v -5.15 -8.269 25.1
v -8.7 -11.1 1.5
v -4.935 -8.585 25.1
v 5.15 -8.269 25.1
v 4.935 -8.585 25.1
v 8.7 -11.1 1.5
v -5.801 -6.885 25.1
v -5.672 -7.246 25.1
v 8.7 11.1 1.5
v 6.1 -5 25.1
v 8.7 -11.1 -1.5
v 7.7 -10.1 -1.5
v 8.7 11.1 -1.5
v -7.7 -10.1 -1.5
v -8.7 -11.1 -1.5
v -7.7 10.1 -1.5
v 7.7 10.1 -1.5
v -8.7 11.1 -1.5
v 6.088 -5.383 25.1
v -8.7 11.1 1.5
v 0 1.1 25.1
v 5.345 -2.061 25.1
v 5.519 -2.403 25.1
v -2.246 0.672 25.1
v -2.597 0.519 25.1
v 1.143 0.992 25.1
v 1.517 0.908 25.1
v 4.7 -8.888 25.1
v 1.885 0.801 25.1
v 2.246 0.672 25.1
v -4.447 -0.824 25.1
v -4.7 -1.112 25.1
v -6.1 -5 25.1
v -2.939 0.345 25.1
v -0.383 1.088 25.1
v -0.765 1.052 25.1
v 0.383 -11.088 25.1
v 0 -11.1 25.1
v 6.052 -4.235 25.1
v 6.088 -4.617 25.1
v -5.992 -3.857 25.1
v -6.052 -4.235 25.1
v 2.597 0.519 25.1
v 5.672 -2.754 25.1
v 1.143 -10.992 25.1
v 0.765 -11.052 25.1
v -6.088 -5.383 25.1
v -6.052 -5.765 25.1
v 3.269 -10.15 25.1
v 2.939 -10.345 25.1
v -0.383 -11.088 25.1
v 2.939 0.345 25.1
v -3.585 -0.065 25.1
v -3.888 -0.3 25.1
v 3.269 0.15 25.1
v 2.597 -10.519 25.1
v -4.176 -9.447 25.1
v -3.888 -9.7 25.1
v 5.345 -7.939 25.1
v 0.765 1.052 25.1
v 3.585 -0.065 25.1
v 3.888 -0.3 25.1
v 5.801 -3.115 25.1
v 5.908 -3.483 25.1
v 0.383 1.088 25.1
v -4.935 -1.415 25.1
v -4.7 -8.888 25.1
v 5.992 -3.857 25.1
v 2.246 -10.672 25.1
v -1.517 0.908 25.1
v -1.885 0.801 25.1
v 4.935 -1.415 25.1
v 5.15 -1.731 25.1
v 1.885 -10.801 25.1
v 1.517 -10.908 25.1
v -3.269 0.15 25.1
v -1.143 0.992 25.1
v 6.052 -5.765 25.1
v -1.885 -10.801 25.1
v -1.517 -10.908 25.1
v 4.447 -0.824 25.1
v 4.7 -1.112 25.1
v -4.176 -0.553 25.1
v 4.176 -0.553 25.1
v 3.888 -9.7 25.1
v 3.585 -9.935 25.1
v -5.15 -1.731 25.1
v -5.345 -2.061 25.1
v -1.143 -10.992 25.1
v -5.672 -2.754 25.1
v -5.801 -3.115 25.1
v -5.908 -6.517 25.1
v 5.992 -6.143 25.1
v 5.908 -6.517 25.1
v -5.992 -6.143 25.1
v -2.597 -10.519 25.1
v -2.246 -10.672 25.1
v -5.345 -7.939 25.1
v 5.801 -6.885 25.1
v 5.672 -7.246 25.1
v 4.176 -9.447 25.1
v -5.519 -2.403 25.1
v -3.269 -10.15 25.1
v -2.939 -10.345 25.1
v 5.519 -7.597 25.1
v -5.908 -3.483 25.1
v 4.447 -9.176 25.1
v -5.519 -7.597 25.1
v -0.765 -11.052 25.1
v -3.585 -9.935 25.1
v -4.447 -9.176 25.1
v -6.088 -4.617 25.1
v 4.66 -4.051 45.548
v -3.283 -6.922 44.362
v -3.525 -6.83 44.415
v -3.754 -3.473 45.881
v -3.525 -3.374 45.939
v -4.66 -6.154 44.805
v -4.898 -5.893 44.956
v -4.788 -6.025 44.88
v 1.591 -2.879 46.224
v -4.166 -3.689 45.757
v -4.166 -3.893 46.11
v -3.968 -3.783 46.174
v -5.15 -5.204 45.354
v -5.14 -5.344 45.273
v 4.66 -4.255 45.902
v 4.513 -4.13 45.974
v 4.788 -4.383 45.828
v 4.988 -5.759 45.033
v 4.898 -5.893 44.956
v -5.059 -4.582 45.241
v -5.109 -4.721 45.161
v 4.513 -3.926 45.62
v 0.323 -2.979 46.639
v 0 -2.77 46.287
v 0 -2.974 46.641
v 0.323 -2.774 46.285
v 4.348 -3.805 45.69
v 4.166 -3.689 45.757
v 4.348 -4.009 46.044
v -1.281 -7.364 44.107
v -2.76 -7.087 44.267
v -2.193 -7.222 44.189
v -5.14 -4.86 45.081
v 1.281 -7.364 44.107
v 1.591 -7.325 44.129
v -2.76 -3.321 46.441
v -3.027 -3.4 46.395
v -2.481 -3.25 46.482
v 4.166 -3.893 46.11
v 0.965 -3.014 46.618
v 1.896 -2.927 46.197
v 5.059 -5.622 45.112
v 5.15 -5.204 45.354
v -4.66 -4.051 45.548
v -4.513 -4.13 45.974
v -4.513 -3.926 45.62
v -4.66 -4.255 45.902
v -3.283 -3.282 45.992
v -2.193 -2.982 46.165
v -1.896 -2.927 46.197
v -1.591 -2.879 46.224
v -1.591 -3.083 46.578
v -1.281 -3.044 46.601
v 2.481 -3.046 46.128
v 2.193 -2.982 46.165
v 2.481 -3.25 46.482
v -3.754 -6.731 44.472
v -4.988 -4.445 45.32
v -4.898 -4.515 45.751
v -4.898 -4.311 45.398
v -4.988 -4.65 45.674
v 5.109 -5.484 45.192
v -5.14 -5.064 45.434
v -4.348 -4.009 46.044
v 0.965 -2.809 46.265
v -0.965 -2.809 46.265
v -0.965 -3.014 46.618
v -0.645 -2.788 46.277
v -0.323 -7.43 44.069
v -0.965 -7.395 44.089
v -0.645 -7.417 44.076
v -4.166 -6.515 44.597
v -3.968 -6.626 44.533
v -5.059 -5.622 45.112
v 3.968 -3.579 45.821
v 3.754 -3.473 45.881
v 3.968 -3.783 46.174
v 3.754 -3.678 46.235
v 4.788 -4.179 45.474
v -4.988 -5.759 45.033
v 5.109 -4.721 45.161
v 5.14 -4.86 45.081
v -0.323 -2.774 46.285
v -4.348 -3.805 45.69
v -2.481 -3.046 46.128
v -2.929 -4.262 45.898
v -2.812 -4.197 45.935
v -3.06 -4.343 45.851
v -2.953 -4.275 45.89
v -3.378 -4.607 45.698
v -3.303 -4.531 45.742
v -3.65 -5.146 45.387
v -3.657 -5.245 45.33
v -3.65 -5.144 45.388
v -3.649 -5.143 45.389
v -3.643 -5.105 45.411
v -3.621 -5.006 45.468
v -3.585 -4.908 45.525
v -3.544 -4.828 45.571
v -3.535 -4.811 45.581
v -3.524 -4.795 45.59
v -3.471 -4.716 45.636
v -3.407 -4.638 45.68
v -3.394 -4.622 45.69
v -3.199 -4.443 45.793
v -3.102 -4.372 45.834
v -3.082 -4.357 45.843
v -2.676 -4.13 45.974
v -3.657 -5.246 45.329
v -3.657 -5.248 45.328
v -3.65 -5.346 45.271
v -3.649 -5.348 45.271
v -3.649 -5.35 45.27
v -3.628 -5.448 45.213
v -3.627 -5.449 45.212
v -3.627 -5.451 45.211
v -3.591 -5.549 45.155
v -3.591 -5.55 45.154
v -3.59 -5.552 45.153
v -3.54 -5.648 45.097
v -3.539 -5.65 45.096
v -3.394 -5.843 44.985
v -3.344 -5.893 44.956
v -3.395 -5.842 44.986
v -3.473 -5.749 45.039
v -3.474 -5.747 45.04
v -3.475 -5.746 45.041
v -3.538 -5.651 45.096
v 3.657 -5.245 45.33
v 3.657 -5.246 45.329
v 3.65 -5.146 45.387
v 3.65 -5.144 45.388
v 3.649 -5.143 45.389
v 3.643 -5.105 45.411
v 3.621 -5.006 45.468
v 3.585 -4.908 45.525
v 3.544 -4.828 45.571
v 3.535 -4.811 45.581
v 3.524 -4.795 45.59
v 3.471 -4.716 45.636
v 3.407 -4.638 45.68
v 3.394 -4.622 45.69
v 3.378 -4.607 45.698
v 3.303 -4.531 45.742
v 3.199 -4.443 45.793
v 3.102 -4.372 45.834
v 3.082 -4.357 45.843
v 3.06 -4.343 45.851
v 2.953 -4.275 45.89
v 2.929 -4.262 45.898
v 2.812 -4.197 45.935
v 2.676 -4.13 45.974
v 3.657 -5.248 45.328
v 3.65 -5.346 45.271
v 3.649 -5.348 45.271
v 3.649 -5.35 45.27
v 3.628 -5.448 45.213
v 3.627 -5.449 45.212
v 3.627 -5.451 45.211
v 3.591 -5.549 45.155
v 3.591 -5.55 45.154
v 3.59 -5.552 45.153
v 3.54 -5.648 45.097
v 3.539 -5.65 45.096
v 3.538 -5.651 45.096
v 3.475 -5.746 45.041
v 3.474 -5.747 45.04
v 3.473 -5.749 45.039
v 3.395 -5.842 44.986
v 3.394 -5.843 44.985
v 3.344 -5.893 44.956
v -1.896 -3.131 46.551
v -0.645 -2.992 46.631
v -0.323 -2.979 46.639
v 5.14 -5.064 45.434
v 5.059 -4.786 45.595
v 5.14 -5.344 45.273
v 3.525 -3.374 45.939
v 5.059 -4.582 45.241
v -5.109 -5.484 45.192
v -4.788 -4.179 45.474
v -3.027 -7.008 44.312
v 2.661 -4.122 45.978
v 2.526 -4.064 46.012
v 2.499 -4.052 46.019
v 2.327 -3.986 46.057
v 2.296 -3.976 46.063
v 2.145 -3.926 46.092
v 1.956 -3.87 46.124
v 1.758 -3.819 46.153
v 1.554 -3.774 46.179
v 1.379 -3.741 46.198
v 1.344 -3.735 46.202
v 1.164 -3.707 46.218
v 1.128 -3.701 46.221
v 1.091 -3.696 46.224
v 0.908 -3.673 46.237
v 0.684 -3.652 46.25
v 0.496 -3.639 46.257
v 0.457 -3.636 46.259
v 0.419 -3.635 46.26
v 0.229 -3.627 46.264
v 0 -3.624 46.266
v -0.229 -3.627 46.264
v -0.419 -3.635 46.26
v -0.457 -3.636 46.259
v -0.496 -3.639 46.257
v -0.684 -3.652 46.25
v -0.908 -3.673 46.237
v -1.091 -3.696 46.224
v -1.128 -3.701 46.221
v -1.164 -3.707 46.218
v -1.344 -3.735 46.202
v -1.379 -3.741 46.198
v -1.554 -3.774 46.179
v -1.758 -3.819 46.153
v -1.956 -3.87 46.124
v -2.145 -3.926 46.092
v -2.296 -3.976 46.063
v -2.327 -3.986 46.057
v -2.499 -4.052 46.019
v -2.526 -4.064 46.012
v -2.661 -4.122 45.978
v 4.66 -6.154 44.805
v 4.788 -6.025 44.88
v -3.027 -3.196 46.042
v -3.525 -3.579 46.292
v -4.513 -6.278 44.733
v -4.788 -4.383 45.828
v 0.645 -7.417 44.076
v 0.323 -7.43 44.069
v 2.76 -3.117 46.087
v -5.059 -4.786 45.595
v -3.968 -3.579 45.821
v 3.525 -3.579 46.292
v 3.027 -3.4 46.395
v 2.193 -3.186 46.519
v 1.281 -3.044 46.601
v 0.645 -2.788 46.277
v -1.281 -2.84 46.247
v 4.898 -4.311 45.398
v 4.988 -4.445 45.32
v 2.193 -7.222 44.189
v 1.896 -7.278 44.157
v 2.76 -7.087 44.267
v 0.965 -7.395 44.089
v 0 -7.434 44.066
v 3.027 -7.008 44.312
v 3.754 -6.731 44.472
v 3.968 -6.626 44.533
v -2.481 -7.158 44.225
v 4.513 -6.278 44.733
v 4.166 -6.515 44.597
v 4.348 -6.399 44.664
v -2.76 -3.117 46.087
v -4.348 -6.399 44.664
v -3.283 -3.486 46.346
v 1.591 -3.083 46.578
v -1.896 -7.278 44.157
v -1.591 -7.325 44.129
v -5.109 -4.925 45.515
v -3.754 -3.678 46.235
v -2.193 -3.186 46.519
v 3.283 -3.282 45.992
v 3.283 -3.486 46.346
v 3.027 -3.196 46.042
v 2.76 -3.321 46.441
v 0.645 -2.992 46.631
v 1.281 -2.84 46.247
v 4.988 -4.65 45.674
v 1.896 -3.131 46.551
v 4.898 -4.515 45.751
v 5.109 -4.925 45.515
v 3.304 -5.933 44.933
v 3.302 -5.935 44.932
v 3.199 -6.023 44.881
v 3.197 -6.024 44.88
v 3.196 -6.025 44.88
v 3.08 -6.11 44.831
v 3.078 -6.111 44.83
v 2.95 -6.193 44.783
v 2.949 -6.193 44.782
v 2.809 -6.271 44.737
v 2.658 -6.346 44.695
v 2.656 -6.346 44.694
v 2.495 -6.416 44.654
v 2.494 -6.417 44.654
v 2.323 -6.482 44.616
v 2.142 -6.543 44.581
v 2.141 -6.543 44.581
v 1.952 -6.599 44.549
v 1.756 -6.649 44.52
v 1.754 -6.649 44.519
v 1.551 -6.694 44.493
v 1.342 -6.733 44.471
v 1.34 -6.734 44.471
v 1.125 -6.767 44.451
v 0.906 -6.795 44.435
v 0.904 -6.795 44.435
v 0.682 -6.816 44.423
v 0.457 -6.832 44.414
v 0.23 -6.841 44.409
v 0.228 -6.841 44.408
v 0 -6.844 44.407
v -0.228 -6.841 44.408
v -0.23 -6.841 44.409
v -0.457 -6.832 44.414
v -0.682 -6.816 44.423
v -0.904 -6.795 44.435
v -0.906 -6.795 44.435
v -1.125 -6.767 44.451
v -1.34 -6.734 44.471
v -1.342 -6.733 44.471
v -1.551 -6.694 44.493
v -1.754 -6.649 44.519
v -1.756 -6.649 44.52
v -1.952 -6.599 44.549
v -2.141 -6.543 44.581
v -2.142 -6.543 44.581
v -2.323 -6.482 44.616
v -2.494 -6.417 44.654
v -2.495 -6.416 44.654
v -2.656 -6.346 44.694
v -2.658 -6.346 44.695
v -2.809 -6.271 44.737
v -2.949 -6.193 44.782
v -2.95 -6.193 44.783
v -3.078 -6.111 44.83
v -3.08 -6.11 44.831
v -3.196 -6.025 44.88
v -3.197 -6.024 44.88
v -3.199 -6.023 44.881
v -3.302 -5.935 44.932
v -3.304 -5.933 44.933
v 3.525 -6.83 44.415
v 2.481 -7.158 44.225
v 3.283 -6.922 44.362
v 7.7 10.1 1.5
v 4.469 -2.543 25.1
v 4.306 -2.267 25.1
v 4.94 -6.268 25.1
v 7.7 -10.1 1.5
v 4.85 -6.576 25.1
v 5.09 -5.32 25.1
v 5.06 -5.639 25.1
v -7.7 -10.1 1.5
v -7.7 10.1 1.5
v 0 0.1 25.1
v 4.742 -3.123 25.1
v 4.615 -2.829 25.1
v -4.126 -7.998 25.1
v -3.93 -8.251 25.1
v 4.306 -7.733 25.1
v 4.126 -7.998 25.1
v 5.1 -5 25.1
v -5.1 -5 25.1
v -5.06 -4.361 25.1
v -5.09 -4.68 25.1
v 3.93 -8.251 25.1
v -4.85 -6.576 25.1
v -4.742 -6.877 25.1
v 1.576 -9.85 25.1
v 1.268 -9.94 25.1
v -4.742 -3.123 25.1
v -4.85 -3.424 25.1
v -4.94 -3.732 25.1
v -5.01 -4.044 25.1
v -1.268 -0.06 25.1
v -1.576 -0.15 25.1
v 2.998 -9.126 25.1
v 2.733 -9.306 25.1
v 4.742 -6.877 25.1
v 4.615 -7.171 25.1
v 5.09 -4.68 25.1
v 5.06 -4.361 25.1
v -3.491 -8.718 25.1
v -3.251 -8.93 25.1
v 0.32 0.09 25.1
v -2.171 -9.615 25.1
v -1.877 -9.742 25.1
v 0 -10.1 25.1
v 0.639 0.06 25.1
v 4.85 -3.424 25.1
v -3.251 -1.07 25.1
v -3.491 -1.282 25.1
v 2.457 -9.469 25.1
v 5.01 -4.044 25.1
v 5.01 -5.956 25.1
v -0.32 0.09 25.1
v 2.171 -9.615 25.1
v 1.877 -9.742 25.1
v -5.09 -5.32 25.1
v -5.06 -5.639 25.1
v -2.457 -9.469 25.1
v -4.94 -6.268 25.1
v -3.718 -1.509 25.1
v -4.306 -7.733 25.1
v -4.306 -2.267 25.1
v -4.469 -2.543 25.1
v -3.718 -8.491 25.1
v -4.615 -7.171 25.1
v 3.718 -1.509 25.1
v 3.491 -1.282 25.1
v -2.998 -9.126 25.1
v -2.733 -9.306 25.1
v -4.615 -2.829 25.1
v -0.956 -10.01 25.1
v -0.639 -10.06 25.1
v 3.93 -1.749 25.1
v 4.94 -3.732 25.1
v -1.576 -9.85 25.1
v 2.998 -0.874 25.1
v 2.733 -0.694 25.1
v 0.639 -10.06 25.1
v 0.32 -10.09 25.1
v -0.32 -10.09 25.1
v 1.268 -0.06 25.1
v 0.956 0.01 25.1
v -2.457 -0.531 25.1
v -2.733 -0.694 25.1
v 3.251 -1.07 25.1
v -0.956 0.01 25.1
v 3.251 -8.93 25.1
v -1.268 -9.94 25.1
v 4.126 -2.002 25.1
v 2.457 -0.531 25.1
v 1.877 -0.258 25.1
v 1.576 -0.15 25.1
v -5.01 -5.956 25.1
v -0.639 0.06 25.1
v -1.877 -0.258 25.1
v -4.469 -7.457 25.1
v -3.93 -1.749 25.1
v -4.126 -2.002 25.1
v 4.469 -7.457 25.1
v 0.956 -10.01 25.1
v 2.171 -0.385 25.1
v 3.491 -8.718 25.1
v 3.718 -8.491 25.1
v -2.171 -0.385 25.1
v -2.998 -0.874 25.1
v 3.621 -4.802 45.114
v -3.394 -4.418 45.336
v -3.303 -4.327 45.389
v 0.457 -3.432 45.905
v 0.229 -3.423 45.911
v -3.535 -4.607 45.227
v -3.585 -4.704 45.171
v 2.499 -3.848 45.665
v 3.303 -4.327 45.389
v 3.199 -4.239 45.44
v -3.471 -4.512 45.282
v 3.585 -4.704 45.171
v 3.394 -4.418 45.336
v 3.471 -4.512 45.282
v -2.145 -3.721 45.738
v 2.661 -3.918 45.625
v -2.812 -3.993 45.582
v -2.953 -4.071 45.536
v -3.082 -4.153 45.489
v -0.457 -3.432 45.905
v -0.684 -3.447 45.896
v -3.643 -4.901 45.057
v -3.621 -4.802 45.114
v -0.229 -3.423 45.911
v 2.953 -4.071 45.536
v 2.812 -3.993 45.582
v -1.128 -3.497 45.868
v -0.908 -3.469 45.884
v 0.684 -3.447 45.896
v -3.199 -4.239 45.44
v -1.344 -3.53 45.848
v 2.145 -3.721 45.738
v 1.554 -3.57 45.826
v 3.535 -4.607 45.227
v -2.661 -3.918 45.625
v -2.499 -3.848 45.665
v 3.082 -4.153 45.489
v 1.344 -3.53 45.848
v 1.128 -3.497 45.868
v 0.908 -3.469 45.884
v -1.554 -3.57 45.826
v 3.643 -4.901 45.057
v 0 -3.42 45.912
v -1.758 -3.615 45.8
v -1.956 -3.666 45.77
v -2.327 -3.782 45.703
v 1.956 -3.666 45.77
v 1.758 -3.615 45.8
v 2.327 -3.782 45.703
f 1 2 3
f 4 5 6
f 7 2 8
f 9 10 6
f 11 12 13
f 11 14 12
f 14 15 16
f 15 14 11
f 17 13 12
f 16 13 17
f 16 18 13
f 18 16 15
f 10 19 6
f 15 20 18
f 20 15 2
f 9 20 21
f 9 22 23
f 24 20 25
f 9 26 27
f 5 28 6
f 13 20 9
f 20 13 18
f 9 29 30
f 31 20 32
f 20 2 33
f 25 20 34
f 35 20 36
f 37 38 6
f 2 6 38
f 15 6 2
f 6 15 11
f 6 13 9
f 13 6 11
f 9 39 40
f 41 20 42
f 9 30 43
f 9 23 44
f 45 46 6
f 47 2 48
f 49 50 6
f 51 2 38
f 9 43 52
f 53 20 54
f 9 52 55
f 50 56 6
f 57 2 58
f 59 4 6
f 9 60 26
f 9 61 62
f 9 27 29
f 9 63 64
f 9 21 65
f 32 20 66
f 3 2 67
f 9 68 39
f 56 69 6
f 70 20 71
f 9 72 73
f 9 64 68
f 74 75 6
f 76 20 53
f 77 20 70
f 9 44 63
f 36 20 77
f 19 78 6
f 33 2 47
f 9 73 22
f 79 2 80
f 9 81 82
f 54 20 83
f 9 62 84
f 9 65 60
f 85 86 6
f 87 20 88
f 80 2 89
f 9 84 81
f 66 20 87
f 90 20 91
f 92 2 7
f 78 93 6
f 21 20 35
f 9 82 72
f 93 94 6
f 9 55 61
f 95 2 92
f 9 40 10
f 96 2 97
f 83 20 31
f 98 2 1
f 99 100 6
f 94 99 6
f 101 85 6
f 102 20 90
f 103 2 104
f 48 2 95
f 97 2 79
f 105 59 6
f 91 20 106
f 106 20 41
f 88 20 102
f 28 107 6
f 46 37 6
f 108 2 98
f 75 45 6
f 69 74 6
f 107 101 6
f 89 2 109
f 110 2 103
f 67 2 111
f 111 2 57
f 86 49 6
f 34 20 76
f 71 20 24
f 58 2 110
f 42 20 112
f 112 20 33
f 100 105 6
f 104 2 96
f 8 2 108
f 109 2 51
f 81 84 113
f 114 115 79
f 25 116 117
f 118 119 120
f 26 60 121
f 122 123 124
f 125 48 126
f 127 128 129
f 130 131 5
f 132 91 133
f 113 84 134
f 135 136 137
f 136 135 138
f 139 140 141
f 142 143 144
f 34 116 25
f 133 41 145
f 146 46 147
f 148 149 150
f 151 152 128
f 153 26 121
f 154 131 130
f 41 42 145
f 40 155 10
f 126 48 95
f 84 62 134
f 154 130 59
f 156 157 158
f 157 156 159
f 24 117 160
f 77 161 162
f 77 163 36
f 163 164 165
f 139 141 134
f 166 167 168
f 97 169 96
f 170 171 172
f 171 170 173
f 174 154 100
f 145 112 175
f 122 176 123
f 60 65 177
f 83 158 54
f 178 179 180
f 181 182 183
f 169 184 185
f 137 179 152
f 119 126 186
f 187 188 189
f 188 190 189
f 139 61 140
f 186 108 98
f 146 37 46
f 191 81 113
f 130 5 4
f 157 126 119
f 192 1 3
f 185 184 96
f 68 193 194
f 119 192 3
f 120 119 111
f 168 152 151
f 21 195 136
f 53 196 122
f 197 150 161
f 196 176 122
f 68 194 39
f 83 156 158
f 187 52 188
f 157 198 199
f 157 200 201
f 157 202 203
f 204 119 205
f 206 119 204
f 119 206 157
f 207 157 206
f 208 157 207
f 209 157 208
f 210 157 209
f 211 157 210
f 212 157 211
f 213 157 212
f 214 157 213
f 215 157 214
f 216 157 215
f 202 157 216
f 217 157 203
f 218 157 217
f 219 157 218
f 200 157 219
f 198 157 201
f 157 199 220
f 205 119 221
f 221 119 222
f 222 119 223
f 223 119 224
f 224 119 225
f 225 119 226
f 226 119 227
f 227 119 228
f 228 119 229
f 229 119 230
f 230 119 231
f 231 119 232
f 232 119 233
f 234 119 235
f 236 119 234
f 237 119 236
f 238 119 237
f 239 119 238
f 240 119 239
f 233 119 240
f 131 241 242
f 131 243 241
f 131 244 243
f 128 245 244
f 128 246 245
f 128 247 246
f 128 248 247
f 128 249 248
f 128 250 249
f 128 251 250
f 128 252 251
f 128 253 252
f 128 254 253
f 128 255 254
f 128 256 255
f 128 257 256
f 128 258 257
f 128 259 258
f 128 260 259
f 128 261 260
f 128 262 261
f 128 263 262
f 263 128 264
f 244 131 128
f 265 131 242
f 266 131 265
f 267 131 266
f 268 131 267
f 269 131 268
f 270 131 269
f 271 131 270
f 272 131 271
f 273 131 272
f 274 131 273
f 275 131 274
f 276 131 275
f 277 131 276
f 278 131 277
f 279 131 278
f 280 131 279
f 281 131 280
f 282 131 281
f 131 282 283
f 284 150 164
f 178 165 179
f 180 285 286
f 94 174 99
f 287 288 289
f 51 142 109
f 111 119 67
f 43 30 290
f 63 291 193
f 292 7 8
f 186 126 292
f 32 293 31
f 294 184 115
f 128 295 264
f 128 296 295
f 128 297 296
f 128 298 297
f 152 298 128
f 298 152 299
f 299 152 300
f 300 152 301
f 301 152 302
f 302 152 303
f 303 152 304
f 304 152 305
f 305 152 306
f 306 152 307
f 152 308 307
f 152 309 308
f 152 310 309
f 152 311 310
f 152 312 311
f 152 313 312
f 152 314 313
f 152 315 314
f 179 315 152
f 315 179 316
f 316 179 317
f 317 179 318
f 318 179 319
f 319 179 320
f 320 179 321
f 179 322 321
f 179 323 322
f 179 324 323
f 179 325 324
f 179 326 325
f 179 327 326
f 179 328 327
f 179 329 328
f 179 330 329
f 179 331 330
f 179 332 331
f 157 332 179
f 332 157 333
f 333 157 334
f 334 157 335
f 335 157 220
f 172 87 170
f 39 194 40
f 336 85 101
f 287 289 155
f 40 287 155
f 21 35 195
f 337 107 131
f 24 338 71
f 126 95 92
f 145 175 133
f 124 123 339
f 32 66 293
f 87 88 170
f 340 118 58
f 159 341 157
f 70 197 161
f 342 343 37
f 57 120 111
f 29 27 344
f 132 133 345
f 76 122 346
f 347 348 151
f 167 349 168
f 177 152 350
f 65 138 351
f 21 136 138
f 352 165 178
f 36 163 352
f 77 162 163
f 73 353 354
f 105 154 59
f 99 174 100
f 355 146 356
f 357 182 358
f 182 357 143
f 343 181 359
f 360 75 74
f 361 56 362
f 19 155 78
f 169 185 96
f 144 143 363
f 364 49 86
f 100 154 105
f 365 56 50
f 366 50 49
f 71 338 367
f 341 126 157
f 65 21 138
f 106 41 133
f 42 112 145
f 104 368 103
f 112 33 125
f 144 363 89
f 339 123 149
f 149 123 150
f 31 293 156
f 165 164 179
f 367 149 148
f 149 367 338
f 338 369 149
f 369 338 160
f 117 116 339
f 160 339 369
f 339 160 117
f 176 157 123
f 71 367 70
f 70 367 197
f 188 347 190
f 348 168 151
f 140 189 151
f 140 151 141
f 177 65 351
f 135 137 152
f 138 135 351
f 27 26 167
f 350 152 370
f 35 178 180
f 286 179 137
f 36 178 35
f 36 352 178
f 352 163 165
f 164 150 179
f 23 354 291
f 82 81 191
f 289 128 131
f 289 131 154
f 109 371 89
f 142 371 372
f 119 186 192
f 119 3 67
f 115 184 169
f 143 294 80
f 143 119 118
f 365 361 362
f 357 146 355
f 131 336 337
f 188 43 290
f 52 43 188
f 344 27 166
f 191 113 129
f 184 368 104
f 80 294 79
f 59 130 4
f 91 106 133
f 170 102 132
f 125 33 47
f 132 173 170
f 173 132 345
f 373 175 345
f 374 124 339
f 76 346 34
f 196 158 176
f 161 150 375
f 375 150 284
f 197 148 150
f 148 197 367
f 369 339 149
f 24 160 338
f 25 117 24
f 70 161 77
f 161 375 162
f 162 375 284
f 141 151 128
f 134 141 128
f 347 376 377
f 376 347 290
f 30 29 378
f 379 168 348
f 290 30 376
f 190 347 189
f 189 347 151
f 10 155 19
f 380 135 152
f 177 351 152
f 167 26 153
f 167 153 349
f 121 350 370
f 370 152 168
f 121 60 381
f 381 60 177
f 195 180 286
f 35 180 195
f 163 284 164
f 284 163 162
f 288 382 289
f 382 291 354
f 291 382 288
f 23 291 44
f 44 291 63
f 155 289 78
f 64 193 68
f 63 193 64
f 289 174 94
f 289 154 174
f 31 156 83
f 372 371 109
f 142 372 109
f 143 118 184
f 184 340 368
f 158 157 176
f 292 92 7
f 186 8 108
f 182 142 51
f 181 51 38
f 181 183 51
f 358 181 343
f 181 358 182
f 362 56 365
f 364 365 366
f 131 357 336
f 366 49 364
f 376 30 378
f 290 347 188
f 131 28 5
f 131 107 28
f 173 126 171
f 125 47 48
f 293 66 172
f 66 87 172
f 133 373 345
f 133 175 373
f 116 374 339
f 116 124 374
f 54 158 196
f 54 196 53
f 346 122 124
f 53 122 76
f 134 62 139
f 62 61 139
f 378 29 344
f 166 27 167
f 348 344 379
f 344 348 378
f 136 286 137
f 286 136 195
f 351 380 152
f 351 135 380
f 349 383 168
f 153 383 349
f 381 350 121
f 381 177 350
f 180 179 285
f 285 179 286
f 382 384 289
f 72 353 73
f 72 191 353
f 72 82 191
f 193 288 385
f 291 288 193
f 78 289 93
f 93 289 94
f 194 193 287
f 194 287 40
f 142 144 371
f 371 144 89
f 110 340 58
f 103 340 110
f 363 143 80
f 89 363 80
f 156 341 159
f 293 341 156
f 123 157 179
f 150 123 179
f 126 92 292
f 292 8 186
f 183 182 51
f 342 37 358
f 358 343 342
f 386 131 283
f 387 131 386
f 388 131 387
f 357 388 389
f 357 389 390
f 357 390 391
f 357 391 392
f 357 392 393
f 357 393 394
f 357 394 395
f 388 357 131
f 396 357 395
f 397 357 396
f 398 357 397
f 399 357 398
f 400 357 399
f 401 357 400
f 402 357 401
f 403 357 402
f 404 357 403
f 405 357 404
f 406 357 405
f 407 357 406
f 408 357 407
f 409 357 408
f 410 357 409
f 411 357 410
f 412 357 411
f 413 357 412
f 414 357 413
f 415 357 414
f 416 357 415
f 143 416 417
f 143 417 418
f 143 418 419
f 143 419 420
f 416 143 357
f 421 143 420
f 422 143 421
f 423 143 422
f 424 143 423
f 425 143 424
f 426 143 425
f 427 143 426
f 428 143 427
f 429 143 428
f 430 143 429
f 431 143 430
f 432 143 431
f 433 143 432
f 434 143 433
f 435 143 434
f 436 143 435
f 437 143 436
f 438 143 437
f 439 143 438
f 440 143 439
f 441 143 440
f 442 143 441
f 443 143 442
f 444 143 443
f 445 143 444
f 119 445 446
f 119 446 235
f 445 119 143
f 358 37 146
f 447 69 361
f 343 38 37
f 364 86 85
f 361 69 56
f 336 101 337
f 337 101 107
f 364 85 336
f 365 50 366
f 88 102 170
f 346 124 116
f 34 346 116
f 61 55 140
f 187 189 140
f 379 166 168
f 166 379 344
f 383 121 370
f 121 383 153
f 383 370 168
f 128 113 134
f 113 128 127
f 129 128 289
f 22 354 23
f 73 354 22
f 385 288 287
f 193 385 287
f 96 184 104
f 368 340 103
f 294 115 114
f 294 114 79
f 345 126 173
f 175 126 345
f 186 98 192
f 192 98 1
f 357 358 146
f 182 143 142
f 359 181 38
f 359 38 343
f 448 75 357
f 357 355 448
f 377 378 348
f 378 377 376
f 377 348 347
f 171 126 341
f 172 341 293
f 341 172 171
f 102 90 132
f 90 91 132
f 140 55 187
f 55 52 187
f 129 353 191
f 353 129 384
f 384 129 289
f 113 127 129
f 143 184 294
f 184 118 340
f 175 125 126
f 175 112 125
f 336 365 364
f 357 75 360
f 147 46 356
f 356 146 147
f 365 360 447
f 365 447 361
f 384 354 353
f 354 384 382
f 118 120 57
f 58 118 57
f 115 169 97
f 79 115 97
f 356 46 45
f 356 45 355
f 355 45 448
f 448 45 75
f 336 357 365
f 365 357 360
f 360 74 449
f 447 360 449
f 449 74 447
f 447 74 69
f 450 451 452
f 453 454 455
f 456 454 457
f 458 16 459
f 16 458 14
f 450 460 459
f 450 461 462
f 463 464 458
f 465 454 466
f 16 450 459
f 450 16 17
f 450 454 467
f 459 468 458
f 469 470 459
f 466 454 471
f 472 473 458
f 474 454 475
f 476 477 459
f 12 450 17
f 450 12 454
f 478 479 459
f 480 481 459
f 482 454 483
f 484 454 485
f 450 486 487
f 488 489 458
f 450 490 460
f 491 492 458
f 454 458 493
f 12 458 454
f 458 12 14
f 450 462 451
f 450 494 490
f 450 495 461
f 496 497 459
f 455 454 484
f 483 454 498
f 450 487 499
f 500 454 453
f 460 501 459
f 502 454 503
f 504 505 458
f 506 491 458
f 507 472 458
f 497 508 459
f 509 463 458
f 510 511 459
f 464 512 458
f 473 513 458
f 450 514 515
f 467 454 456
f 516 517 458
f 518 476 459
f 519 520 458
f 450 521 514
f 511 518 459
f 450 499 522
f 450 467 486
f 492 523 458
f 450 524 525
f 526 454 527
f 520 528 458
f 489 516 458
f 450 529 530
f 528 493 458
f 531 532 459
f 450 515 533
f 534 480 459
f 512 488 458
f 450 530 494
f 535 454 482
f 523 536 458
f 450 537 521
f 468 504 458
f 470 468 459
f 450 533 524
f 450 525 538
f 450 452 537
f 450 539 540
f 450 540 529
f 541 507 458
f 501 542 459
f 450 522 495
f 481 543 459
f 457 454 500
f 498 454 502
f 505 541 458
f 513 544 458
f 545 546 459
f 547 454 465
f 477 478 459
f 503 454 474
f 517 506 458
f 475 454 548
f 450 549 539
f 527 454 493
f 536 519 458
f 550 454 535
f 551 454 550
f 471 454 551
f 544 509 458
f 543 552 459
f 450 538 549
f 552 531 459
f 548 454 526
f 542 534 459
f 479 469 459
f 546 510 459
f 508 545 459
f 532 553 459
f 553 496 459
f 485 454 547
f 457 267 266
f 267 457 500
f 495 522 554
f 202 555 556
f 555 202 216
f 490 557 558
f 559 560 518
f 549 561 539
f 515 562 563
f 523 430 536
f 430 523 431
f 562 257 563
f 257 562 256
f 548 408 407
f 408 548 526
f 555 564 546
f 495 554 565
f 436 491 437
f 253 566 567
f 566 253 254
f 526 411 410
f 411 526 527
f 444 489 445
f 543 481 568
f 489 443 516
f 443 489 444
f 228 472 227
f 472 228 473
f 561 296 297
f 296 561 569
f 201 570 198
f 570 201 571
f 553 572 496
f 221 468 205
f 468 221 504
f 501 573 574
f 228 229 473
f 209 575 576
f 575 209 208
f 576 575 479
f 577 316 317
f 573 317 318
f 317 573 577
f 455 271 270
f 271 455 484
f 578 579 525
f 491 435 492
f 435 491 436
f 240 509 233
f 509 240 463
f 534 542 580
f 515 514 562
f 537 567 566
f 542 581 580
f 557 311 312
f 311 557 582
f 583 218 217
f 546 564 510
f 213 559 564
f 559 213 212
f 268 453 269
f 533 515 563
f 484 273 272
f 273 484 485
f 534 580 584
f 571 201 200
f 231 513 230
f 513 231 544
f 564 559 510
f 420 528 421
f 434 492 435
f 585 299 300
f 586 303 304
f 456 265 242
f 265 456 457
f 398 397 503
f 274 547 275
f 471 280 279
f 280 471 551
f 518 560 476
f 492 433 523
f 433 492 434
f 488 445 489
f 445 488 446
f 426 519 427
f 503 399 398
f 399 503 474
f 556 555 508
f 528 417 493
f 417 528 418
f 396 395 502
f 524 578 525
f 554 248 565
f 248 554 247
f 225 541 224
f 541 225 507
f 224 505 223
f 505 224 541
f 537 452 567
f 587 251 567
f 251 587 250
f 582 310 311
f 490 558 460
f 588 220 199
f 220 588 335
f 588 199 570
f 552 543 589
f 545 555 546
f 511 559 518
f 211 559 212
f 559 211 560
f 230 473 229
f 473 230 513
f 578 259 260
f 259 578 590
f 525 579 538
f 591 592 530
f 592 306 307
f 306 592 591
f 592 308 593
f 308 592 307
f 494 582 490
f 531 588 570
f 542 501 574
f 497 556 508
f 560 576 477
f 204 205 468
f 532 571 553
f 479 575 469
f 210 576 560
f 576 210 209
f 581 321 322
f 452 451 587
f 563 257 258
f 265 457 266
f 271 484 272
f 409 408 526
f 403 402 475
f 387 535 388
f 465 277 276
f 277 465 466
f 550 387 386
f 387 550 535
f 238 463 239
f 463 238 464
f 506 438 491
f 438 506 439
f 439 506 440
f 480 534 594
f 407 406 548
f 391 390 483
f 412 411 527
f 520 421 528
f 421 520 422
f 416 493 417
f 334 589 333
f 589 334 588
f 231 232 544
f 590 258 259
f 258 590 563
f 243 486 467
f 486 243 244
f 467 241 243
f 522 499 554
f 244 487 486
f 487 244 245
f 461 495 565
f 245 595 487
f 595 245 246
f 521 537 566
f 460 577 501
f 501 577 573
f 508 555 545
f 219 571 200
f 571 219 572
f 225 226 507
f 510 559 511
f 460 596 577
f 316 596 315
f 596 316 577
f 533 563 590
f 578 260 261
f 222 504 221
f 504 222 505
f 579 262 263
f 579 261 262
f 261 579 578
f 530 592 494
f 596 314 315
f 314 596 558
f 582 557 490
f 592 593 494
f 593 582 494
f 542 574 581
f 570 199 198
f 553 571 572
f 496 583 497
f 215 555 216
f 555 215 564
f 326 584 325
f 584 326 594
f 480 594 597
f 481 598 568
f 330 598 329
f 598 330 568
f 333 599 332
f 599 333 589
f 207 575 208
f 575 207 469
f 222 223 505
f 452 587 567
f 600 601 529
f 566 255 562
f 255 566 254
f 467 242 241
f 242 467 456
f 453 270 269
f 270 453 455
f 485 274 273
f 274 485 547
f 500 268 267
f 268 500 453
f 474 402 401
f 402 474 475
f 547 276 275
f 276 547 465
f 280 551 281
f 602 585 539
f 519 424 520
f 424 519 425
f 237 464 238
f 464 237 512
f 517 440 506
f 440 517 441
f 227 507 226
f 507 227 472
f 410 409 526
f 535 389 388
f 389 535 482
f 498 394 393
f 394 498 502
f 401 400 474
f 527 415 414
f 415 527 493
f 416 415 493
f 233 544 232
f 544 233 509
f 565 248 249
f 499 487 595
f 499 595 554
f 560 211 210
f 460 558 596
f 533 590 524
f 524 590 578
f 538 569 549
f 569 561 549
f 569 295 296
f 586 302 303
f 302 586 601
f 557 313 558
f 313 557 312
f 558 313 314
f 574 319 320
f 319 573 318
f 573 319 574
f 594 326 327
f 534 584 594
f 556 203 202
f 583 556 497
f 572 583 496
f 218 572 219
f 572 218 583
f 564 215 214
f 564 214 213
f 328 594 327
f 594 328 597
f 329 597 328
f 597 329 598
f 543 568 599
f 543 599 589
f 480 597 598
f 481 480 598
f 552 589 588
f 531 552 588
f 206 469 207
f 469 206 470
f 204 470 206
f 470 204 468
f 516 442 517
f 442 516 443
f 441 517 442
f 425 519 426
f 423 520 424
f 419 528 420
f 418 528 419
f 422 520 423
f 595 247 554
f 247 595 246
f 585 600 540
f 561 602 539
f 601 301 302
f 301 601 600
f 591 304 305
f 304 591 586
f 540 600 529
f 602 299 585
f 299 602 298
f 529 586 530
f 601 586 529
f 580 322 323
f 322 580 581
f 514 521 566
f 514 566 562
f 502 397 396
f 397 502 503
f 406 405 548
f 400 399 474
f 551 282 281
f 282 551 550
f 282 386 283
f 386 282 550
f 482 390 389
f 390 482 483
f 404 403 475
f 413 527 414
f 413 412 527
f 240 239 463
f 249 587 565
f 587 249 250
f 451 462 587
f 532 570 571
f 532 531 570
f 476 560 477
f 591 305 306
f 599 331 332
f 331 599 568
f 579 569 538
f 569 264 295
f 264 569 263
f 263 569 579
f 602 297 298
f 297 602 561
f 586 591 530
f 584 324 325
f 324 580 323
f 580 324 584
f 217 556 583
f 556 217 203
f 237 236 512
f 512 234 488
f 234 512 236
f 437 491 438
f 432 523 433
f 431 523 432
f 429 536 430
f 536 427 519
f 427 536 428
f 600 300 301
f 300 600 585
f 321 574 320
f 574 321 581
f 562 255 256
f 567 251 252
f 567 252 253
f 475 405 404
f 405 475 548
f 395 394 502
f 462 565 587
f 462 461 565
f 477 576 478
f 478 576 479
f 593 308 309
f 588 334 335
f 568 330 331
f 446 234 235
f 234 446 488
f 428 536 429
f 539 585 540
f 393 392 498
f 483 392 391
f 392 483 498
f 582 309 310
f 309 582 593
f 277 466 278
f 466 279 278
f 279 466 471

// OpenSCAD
// http://www.thingiverse.com/thing:387301
// 12/17/18 - (SRC) Added preview colors
$fn=100;

$fs=0.1;
module FanDuct() {
	tol=0.10;
	wallThickness=1;//0.8;

	module Shape(dia) {
		color("blue") hull() {
			cube([15.2+dia*2,20+dia*2,3],center=true);
			translate([0,-5,25])cylinder(h=0.1,d=10+dia*2);
		}
		color("red") hull() {
			translate([0,-5,25])cylinder(h=0.1,d=10+dia*2);
			translate([0,-5,45])rotate([30,0,0])scale([1.0,0.5,1])cylinder(h=0.5-dia/12,d=7+dia*3);
		}
	}

	difference() {
		Shape(dia=wallThickness+tol);
		Shape(dia=tol);
	}
}


FanDuct();
